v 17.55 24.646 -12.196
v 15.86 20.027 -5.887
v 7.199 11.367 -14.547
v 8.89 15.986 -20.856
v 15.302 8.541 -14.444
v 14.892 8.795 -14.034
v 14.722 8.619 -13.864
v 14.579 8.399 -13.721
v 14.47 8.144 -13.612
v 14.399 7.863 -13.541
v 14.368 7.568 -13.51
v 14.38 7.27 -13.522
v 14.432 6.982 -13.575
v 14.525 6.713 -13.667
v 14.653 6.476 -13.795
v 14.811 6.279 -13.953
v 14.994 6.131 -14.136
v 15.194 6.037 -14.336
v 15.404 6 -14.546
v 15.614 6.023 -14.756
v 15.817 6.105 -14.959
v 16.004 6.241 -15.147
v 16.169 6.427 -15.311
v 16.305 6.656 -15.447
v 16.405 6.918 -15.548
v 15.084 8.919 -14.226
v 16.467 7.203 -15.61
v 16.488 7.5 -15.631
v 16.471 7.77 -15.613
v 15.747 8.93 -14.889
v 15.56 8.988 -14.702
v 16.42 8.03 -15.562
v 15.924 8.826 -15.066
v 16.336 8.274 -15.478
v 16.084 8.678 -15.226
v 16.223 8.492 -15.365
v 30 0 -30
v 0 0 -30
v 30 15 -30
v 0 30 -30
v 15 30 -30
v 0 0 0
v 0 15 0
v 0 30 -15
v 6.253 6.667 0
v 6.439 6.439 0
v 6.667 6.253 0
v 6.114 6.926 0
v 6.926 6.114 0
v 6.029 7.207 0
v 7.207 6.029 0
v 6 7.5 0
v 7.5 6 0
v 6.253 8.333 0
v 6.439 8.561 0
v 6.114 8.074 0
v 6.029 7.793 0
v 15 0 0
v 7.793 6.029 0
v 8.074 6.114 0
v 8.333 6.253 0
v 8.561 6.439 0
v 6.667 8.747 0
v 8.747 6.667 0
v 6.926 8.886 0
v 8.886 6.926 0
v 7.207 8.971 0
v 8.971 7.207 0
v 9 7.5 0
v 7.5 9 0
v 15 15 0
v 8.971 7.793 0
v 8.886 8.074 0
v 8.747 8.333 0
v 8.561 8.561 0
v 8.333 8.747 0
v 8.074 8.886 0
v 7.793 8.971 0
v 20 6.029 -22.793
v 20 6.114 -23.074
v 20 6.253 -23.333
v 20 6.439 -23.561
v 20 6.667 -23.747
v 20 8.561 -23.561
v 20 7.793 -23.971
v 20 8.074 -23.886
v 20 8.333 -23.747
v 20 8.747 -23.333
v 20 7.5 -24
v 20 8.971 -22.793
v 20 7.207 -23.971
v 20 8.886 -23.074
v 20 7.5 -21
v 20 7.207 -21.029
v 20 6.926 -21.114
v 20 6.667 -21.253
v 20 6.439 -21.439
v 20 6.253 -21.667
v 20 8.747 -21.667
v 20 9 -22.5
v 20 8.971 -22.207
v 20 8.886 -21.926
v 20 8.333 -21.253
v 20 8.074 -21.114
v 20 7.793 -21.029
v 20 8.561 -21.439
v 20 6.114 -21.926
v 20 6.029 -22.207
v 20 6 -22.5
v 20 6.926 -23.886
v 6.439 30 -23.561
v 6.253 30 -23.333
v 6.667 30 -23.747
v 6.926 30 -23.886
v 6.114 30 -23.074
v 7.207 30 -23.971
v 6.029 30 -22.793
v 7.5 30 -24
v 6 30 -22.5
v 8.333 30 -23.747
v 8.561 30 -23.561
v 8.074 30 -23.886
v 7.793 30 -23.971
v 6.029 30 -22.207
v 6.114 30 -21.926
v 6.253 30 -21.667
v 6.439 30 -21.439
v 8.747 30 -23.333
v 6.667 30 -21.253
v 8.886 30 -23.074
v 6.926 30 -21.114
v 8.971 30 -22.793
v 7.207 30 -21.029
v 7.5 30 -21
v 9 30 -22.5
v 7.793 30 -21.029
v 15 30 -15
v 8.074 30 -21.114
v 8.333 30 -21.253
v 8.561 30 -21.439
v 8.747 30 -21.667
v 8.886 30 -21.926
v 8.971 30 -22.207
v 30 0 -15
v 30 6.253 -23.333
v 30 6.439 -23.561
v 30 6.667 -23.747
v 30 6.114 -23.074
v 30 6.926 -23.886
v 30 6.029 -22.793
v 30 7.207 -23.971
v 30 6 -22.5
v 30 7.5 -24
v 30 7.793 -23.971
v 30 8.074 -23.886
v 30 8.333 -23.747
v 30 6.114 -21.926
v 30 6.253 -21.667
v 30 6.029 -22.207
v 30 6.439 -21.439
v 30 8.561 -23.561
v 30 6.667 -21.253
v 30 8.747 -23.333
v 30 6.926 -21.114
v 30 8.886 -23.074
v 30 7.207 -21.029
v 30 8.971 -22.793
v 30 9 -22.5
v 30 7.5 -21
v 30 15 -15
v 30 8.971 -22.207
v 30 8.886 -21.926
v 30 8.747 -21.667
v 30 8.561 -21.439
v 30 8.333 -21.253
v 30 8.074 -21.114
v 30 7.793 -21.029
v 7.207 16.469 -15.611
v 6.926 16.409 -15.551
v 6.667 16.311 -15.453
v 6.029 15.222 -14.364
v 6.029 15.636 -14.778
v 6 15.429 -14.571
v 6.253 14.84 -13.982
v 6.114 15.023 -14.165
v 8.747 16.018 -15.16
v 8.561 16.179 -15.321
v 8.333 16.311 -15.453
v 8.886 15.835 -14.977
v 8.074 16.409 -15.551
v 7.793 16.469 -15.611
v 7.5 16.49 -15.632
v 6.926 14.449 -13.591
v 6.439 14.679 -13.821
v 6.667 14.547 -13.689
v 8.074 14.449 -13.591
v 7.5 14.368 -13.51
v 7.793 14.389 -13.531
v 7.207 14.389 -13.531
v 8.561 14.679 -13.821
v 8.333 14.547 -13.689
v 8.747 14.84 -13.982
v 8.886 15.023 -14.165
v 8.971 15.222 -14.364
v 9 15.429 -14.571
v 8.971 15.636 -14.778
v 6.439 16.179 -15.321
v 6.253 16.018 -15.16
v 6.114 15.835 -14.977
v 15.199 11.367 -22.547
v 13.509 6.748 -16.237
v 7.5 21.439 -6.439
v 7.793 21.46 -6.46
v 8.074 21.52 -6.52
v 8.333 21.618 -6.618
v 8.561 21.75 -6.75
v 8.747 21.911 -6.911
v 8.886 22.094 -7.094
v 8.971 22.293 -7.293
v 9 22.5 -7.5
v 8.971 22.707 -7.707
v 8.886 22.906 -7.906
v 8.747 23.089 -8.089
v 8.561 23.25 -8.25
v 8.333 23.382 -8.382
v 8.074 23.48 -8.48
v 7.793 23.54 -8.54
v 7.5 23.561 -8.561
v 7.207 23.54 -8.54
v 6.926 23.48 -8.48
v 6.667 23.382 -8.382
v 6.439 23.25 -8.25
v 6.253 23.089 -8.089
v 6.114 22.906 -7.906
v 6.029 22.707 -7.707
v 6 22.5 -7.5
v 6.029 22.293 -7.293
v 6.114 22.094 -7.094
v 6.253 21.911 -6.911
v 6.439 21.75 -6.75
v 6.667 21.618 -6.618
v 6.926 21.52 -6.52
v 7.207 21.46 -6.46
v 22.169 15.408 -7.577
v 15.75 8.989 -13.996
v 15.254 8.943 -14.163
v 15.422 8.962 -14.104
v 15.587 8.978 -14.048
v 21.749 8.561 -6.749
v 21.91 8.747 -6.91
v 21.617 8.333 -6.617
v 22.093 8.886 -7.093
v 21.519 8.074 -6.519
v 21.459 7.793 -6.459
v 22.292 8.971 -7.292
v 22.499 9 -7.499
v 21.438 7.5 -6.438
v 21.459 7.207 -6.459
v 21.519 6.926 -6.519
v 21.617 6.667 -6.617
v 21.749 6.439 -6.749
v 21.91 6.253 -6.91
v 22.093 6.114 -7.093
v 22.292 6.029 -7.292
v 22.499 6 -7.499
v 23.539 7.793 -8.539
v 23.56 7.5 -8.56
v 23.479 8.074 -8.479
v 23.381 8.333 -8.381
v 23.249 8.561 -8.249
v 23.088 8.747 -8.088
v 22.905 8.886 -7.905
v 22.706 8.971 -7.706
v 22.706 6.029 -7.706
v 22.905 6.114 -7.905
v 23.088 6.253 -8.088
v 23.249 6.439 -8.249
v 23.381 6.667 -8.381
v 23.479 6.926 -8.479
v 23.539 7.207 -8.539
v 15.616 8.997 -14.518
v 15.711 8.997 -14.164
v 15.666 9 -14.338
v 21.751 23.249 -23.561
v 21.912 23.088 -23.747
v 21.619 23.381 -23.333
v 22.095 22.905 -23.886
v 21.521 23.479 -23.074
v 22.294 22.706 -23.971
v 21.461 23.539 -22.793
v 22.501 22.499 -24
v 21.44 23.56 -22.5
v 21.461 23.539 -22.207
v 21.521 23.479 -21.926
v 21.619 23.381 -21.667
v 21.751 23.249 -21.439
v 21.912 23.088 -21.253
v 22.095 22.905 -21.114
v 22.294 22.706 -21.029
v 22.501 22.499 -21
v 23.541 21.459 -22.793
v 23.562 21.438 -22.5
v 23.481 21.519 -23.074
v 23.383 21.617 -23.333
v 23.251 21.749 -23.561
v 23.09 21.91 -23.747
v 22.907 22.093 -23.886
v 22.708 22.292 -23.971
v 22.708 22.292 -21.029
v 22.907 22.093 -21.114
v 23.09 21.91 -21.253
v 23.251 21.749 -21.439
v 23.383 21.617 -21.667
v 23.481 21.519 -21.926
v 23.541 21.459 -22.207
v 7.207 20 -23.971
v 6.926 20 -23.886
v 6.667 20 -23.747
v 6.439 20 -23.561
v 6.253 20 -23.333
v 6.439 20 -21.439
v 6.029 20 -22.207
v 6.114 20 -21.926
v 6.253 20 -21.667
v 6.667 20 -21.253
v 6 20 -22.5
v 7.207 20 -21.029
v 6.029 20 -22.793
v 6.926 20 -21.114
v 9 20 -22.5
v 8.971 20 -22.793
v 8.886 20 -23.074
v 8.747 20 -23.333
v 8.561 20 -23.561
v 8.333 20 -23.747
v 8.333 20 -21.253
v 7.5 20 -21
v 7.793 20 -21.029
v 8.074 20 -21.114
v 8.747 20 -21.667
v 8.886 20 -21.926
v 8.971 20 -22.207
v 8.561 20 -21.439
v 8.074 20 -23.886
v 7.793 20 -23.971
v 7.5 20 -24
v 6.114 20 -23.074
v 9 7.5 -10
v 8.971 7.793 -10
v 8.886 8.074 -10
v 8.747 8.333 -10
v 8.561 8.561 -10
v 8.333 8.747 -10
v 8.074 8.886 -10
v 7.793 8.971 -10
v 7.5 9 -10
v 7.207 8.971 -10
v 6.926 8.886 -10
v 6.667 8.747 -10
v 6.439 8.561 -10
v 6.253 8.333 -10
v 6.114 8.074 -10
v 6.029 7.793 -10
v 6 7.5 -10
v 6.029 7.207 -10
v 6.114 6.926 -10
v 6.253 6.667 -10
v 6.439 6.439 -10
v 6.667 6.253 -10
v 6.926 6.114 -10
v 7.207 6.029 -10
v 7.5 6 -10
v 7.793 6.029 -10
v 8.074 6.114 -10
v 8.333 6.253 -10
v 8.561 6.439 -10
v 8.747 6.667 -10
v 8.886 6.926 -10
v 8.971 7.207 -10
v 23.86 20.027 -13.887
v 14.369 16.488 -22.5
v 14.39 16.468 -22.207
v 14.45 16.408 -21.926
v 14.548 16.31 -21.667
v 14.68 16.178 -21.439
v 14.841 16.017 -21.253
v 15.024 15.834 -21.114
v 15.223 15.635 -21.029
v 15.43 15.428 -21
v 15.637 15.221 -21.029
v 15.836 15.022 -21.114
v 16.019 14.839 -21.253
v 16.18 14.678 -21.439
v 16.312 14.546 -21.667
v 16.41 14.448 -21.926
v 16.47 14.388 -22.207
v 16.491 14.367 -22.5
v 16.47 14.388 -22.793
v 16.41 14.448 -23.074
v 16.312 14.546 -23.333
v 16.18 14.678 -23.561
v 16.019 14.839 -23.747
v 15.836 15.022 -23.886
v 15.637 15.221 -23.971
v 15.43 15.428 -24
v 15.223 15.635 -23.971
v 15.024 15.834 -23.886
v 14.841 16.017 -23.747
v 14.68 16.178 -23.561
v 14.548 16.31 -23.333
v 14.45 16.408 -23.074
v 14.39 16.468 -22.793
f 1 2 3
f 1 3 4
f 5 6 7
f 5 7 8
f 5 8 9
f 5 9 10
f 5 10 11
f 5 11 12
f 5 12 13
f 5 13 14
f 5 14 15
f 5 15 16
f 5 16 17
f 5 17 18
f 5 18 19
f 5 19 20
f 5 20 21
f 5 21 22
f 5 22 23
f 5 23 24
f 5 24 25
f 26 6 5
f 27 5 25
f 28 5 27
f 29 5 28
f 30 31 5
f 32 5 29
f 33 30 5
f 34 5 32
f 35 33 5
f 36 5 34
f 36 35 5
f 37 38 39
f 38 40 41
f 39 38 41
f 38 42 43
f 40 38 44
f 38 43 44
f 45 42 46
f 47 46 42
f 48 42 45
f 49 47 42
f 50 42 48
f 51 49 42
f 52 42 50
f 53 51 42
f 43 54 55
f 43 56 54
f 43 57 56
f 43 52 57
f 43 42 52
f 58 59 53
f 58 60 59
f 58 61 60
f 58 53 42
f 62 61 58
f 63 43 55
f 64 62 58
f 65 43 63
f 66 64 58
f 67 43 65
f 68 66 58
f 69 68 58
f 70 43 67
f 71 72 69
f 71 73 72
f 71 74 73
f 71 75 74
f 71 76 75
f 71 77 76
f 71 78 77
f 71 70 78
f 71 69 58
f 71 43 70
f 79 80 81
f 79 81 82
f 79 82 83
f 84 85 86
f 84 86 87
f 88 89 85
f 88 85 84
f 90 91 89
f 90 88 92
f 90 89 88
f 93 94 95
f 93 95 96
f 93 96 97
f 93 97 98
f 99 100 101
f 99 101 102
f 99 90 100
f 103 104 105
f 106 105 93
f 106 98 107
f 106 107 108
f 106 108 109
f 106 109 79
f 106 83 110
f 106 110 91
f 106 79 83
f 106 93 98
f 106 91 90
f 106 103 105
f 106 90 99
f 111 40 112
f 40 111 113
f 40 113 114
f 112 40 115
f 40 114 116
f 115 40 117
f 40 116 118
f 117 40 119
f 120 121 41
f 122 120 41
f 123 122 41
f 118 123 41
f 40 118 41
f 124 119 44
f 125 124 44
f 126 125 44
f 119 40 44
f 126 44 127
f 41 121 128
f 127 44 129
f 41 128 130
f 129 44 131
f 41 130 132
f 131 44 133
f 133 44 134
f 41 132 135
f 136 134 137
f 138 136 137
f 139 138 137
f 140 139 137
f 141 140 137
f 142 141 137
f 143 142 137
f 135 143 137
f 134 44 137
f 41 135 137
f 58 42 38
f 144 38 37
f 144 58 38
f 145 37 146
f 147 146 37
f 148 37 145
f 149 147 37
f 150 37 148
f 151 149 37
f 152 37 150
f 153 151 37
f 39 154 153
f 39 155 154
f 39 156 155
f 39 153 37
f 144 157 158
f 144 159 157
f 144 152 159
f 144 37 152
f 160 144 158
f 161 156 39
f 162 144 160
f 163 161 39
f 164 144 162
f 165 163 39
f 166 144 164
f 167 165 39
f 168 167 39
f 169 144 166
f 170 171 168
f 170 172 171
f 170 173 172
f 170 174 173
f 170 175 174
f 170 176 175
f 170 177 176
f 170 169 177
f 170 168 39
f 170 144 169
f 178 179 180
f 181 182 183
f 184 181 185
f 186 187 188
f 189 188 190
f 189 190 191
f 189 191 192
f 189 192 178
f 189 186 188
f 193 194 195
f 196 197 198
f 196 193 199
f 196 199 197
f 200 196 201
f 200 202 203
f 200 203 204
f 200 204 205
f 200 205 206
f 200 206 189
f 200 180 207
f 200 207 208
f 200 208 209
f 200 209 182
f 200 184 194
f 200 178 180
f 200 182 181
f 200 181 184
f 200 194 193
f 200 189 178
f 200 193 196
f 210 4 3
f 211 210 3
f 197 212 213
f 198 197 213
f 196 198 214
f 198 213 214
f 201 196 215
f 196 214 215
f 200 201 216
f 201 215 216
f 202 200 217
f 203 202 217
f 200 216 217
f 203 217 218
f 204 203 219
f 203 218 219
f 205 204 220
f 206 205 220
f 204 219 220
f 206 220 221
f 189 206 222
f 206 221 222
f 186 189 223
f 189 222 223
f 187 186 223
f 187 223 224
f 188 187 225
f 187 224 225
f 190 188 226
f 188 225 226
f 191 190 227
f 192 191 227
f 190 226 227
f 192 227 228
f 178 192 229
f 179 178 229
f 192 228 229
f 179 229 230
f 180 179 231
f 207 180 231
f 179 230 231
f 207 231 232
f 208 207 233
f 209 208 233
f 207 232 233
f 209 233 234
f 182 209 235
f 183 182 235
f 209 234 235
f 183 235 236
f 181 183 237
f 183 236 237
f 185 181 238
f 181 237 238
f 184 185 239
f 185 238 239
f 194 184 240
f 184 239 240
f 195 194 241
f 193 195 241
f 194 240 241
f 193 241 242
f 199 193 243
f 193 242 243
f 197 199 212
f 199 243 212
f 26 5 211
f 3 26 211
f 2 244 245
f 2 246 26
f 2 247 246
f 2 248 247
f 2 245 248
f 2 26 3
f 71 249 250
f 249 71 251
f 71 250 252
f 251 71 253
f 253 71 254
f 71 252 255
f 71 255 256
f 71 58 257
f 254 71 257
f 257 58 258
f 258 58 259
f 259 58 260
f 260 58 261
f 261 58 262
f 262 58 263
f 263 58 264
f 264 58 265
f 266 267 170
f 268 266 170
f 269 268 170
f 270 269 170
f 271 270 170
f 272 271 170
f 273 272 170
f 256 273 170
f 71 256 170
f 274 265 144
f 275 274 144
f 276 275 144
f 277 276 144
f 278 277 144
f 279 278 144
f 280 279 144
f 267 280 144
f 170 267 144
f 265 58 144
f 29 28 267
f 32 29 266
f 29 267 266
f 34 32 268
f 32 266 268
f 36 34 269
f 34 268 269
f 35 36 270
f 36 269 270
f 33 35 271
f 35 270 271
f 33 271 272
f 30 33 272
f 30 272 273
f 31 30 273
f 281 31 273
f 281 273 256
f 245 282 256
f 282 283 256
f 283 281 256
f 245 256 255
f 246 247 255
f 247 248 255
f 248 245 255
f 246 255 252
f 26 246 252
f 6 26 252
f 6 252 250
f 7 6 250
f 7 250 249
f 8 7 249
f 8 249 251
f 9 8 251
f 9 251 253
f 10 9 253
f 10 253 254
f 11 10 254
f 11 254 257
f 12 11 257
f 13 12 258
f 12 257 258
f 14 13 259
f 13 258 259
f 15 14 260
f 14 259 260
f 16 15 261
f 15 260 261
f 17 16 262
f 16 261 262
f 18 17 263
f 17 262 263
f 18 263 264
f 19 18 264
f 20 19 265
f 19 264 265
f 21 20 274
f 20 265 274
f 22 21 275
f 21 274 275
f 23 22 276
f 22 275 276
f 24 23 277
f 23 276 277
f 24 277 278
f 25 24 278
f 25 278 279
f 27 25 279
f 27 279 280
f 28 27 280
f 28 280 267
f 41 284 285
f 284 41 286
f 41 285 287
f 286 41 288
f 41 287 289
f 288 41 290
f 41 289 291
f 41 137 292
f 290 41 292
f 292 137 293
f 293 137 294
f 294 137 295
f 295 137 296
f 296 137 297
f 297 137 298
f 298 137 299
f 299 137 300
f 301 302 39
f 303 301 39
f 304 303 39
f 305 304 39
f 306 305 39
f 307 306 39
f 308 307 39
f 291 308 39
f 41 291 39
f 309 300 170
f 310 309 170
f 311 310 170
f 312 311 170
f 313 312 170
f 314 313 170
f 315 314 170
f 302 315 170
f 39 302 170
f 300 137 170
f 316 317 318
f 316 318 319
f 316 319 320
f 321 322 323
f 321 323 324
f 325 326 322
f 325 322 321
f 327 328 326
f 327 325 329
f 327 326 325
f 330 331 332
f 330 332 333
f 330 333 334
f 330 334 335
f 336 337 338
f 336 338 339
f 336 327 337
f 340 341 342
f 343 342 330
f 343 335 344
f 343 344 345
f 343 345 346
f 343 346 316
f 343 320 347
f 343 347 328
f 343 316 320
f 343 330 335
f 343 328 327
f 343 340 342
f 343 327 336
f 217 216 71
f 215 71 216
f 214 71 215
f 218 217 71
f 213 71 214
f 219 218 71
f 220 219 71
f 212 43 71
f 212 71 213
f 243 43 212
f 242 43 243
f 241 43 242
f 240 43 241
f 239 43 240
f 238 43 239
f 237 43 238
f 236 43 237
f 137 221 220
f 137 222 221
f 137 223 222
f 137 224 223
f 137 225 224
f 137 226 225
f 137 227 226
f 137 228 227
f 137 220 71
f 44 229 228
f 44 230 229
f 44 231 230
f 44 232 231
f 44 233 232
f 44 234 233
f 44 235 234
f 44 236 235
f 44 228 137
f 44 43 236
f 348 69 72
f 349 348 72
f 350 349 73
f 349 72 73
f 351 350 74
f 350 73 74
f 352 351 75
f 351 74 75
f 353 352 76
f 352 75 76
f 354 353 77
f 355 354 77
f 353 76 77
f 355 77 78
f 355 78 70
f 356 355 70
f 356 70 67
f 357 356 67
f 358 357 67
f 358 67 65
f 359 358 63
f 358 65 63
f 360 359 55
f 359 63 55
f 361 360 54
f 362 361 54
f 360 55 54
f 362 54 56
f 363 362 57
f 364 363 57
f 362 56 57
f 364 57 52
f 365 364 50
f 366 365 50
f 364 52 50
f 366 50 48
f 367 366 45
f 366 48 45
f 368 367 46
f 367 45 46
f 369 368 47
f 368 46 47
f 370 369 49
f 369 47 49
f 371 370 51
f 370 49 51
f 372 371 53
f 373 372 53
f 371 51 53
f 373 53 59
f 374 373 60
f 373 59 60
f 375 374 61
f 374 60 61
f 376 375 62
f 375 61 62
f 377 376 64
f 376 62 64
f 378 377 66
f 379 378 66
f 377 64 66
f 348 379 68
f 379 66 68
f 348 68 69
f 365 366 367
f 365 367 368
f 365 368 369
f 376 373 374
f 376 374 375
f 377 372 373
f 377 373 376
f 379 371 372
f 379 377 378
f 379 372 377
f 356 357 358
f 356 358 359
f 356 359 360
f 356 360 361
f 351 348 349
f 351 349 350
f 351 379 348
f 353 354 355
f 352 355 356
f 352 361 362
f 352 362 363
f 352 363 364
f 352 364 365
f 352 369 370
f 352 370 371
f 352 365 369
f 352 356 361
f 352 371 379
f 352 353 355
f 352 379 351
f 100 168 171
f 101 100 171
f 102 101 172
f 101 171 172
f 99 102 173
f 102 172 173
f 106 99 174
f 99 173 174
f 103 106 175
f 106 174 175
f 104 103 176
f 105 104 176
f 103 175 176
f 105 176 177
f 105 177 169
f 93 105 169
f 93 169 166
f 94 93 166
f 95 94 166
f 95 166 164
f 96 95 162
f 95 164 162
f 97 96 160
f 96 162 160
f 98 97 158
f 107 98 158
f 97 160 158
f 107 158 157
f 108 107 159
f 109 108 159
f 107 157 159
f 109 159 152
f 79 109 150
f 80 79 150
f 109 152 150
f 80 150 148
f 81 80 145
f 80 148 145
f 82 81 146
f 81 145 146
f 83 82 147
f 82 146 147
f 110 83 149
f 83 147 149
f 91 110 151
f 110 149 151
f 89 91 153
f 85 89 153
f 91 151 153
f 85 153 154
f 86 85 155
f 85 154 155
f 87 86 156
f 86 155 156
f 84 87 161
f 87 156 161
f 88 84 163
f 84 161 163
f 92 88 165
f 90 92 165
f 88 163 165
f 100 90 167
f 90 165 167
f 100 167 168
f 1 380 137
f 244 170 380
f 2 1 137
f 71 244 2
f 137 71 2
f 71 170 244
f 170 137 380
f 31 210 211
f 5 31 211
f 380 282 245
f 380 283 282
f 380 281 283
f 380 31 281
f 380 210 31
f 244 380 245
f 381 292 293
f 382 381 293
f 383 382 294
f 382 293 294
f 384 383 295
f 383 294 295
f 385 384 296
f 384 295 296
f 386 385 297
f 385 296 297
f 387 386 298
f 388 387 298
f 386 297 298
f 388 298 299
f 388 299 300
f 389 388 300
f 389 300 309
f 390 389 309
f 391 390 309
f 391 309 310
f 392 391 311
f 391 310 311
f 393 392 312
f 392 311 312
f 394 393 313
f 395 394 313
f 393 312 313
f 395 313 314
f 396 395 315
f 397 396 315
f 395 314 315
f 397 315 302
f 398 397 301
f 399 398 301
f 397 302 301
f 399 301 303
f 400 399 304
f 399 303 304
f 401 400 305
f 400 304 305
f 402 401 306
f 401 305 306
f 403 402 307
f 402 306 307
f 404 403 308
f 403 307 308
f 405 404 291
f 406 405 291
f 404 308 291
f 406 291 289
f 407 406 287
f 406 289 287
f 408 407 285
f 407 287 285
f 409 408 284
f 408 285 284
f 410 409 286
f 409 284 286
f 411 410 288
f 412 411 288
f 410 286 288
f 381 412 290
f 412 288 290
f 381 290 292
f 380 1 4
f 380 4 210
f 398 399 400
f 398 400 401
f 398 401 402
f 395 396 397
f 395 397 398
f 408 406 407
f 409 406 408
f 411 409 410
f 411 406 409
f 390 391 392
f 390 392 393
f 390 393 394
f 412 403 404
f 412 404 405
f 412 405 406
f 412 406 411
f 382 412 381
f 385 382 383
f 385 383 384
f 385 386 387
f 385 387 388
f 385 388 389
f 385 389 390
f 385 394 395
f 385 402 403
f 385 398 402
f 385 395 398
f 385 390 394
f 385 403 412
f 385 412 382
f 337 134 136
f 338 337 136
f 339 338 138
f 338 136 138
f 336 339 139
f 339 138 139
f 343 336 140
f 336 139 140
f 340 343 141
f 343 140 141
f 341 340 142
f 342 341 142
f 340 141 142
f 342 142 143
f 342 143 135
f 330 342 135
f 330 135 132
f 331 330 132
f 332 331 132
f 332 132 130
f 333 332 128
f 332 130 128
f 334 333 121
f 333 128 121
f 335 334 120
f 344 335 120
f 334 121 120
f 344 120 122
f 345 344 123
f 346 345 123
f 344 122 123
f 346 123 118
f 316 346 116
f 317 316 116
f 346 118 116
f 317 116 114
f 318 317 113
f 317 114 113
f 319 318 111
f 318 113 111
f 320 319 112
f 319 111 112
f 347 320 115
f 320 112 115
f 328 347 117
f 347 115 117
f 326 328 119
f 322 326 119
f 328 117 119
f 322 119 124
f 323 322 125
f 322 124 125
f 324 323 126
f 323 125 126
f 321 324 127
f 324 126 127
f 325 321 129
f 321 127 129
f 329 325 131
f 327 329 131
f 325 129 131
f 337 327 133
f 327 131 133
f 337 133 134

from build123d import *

# Parameters (mm, degrees)
SKETCH1_W           = 30
SKETCH1_H           = 30
BOSS_EXTRUDE1_DEPTH = 30
CUT_EXTRUDE1_DEPTH  = 30
CUT_EXTRUDE2_DEPTH  = 30
CUT_EXTRUDE3_DEPTH  = 30
CUT_EXTRUDE4_DEPTH  = 30
CUT_EXTRUDE5_DEPTH  = 15
SKETCH6_R           = 1.5
CUT_EXTRUDE6_DEPTH  = 10
SKETCH7_R           = 1.5
CUT_EXTRUDE7_DEPTH  = 10
SKETCH8_R           = 1.5
CUT_EXTRUDE8_DEPTH  = 10
SKETCH9_R           = 1.5
CUT_EXTRUDE9_DEPTH  = 10
SKETCH10_R          = 1.5
CUT_EXTRUDE10_DEPTH = 10
SKETCH11_R          = 1.5
CUT_EXTRUDE11_DEPTH = 10


with BuildPart() as part:
    # Sketch1 → Boss-Extrude1 (new body)
    with BuildSketch(Plane.XY):
        with Locations((15, 15)):
            Rectangle(SKETCH1_W, SKETCH1_H)
    extrude(amount=-BOSS_EXTRUDE1_DEPTH)

    # Sketch2 → Cut-Extrude1 (cut)
    with BuildSketch(Plane.XY):
        Polygon((15, 30), (30, 15), (45, 15), (45, 45.619084343), (15, 40.368332998), align=None)
    extrude(amount=-CUT_EXTRUDE1_DEPTH, mode=Mode.SUBTRACT)

    # Sketch3 → Cut-Extrude2 (cut)
    with BuildSketch(Plane.ZY):
        Polygon((0, 15), (-15, 30), (-15, 36.177250049), (9.539630377, 36.177250049), (9.539630377, 15), align=None)
    extrude(amount=-CUT_EXTRUDE2_DEPTH, mode=Mode.SUBTRACT)

    # Sketch4 → Cut-Extrude3 (cut)
    with BuildSketch(Plane.XZ):
        Polygon((15, 0), (30, -15), (40.227840819, -15), (40.227840819, 9.317096887), (15, 8.966367386), align=None)
    extrude(amount=-CUT_EXTRUDE3_DEPTH, mode=Mode.SUBTRACT)

    # 3DSketch1 → Cut-Extrude4 (cut)
    with BuildSketch(Plane(origin=(33.996909354, 3.570047518, -7.566956872), x_dir=(-0.34464530014522, 0.4926249601560642, 0.7990871452595439), z_dir=(-0.2113248654051872, 0.788675134594813, -0.5773502691896257))):
        Polygon((0, 0), (25.47550653, -16.637081723), (36.340550094, 0), (10.865043564, 16.637081723), align=None)
    extrude(amount=CUT_EXTRUDE4_DEPTH, mode=Mode.SUBTRACT)

    # Sketch5 → Cut-Extrude5 (cut)
    with BuildSketch(Plane(origin=(10, 10, 10), x_dir=(0.4082482904638628, 0.40824829046386263, -0.8164965809277264), z_dir=(0.5773502691896263, 0.5773502691896258, 0.5773502691896254))):
        Polygon((19.457058725, 2.946852636), (27.184465336, 5.017404997), (29.255017696, -2.710001614), (21.527611086, -4.780553975), align=None)
    extrude(amount=-CUT_EXTRUDE5_DEPTH, mode=Mode.SUBTRACT)

    # Sketch6 → Cut-Extrude6 (cut)
    with BuildSketch(Plane(origin=(0, 30, 0), x_dir=(1, 0, 0), z_dir=(0, 1, 0))):
        with Locations(Location((7.5, 22.5, 0), (0, 0, 270))):
            Circle(SKETCH6_R)
    extrude(amount=-CUT_EXTRUDE6_DEPTH, mode=Mode.SUBTRACT)

    # Sketch7 → Cut-Extrude7 (cut)
    with BuildSketch(Plane(origin=(0, 7.5, 7.5), x_dir=(1, 0, 0), z_dir=(0, 0.7071067811865477, 0.7071067811865475))):
        with Locations(Location((7.5, 21.213203436, 0), (0, 0, 270))):
            Circle(SKETCH7_R)
    extrude(amount=-CUT_EXTRUDE7_DEPTH, mode=Mode.SUBTRACT)

    # Sketch8 → Cut-Extrude8 (cut)
    with BuildSketch(Plane.XY):
        with Locations((7.5, 7.5)):
            Circle(SKETCH8_R)
    extrude(amount=-CUT_EXTRUDE8_DEPTH, mode=Mode.SUBTRACT)

    # Sketch9 → Cut-Extrude9 (cut)
    with BuildSketch(Plane(origin=(22.5, 22.5, 0), x_dir=(0, 0, -1), z_dir=(0.7071067811865474, 0.7071067811865477, 0))):
        with Locations(Location((22.5, -0.001601718, 0), (0, 0, 90))):
            Circle(SKETCH9_R)
    extrude(amount=-CUT_EXTRUDE9_DEPTH, mode=Mode.SUBTRACT)

    # Sketch10 → Cut-Extrude10 (cut)
    with BuildSketch(Plane(origin=(30, 0, 0), x_dir=(0, 0, -1), z_dir=(1, 0, 0))):
        with Locations(Location((22.5, 7.5, 0), (0, 0, 90))):
            Circle(SKETCH10_R)
    extrude(amount=-CUT_EXTRUDE10_DEPTH, mode=Mode.SUBTRACT)

    # Sketch11 → Cut-Extrude11 (cut)
    with BuildSketch(Plane(origin=(7.5, 0, 7.5), x_dir=(0.7071067811865475, 0, -0.7071067811865477), z_dir=(0.7071067811865477, 0, 0.7071067811865475))):
        with Locations((21.211601718, 7.5)):
            Circle(SKETCH11_R)
    extrude(amount=-CUT_EXTRUDE11_DEPTH, mode=Mode.SUBTRACT)


solid = part.part
